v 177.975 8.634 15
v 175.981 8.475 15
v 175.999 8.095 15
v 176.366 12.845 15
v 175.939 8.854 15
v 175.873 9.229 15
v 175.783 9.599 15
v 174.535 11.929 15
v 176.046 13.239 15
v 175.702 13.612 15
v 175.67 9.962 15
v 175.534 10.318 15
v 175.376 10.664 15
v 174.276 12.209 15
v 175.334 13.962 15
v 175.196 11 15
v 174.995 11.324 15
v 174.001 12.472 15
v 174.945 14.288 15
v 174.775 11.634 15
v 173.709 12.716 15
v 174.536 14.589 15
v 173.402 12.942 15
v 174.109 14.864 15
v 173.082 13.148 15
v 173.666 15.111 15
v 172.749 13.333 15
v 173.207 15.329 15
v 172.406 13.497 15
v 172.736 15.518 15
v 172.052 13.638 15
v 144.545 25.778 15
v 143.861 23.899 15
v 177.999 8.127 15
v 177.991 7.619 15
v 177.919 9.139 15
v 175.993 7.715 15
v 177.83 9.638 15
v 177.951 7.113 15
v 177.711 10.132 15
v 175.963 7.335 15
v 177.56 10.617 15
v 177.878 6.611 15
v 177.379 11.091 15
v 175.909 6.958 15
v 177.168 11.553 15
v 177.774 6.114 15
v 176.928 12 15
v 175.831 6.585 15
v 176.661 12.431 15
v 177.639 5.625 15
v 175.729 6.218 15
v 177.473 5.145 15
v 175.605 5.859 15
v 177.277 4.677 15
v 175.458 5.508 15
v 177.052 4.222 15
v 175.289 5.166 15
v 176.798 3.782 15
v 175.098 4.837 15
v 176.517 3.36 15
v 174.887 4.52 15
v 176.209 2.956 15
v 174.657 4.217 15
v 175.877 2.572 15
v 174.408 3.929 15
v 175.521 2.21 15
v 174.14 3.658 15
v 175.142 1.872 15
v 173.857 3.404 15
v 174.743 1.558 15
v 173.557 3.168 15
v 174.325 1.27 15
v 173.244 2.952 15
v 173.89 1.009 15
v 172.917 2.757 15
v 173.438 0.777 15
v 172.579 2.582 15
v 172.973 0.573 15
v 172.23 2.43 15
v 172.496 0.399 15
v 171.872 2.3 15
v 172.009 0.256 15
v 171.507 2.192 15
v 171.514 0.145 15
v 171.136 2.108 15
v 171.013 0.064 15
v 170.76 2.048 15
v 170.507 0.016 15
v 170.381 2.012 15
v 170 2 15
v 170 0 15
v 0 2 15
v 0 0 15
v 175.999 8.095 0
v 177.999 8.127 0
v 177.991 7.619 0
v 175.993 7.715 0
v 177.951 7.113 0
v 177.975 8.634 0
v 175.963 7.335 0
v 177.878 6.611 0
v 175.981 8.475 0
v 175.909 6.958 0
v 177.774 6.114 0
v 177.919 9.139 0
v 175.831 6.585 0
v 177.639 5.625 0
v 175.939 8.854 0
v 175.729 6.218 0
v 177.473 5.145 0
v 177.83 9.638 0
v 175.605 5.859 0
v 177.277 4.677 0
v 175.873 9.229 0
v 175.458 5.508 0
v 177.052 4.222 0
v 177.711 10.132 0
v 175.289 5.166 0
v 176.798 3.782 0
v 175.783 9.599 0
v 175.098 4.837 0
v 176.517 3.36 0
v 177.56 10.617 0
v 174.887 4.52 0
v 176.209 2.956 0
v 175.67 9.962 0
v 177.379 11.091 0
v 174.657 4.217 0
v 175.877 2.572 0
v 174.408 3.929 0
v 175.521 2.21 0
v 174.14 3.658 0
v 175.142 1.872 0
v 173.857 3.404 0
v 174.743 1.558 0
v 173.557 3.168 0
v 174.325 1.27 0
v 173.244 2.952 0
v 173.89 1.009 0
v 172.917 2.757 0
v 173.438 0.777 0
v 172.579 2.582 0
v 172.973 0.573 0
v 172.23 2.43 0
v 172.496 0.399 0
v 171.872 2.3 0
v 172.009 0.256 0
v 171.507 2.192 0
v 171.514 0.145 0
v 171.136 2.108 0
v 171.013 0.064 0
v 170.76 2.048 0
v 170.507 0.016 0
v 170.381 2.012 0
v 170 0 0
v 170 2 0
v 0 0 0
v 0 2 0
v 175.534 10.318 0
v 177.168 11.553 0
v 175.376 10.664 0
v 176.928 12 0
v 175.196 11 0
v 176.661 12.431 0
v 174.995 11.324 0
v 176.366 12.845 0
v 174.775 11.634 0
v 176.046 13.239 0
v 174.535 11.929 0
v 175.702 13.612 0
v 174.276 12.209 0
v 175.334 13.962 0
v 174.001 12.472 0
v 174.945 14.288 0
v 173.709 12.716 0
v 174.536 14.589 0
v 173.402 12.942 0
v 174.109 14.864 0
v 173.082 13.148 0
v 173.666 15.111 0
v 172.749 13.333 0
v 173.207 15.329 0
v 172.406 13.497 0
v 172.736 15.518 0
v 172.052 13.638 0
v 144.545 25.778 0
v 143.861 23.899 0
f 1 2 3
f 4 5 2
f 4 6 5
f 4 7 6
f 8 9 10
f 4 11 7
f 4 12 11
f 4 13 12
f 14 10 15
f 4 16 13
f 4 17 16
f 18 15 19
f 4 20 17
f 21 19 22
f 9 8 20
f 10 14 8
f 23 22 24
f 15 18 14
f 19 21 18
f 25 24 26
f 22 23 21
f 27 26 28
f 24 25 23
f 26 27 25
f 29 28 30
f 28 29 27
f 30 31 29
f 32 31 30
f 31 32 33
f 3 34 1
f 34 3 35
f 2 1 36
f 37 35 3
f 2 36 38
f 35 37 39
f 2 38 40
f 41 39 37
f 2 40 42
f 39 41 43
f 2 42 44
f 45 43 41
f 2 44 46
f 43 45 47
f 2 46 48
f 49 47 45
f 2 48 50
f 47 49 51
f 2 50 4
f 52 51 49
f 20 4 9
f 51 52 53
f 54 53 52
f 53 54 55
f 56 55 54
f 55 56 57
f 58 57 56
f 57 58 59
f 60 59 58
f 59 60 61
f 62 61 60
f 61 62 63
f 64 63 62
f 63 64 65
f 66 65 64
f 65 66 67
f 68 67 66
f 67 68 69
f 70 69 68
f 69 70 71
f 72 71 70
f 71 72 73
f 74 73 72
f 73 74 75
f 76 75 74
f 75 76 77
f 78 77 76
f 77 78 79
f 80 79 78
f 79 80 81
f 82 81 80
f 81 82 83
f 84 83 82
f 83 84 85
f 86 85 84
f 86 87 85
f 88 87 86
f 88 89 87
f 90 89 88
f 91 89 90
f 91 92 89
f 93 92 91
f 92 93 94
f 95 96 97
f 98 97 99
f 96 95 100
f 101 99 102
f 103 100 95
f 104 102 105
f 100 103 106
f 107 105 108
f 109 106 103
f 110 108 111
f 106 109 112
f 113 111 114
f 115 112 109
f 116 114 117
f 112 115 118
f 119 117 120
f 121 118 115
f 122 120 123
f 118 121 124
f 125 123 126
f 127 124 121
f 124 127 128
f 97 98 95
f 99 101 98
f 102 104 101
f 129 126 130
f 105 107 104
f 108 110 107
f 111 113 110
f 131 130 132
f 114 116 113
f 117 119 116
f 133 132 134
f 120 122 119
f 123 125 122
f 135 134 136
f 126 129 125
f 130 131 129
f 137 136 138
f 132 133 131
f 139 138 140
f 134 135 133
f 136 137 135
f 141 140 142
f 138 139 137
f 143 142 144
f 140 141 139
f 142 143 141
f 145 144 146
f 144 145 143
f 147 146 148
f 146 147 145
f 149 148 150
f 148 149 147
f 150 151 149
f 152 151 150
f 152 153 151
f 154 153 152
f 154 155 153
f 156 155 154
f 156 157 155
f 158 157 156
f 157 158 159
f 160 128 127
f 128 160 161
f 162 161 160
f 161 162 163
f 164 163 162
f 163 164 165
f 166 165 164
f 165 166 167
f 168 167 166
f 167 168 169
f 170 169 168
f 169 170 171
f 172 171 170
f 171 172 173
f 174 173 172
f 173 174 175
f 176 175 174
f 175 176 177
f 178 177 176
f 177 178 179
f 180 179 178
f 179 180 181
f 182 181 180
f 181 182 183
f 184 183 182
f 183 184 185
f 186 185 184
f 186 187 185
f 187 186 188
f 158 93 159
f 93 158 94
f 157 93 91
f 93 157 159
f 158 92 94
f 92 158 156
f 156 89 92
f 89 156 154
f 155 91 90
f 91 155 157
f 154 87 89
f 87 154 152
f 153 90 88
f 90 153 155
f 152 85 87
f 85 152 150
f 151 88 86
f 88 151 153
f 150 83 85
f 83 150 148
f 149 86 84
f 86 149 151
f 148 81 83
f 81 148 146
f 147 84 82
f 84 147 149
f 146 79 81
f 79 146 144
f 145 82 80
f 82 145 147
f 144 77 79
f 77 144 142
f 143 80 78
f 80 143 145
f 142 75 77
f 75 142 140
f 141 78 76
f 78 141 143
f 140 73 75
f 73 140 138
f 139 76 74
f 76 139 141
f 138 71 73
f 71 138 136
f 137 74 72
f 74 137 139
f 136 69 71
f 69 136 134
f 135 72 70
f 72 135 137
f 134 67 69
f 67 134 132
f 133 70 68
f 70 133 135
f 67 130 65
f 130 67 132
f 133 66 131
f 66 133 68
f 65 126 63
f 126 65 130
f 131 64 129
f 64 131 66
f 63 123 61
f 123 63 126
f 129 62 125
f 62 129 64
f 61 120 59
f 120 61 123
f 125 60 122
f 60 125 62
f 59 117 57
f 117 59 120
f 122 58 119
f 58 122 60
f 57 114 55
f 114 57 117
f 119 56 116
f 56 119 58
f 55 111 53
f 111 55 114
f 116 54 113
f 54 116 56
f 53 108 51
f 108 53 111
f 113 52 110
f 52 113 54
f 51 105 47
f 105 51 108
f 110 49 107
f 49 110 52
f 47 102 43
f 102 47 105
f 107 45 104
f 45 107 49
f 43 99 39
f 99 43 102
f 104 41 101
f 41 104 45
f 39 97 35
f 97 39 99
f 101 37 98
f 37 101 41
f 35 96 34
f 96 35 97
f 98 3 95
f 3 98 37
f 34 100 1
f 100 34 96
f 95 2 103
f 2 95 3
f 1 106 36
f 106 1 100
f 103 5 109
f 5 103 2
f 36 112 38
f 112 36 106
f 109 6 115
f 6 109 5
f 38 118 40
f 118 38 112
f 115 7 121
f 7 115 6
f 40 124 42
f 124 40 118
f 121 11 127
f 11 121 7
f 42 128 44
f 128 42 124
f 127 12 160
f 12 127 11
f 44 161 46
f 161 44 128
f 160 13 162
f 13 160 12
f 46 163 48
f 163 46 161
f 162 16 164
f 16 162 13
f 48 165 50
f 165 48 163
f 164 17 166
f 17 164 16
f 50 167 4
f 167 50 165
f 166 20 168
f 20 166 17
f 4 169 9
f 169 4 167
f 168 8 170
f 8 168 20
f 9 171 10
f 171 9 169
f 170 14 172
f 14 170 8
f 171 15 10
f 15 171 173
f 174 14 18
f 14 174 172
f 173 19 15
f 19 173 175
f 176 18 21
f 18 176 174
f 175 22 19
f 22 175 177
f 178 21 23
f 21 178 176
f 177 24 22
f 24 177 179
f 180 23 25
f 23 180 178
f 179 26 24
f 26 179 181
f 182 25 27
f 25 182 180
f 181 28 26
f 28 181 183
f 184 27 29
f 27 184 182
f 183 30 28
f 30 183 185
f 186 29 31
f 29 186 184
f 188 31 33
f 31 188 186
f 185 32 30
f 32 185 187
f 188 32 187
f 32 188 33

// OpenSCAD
// Dashboard wrap band
// Section 1: 17cm straight
// Section 2: 180° curve
// Cross-section: 2mm thick x 15mm tall

$fn = 100;

curve_radius = 6; // 6mm radius for the curve
curve_angle = 160; // degrees
start_angle = -90; // starting angle of curve

union() {
    // Section 1: Straight part (170mm)
    cube([170, 2, 15]);

    // Section 2: 160-degree curve
    translate([170, 2 + curve_radius, 0])
        rotate([0, 0, -90])
            rotate_extrude(angle = 160)
                translate([curve_radius, 0, 0])
                    square([2, 15]);

    // Section 3: Continue backwards for 30mm
    // Calculate end position and angle after curve
    translate([
        170 + (curve_radius + 2) * cos(start_angle + curve_angle),
        2 + curve_radius + (curve_radius + 2) * sin(start_angle + curve_angle),
        0
    ])
        rotate([0, 0, 160])
            cube([30, 2, 15]);
}
